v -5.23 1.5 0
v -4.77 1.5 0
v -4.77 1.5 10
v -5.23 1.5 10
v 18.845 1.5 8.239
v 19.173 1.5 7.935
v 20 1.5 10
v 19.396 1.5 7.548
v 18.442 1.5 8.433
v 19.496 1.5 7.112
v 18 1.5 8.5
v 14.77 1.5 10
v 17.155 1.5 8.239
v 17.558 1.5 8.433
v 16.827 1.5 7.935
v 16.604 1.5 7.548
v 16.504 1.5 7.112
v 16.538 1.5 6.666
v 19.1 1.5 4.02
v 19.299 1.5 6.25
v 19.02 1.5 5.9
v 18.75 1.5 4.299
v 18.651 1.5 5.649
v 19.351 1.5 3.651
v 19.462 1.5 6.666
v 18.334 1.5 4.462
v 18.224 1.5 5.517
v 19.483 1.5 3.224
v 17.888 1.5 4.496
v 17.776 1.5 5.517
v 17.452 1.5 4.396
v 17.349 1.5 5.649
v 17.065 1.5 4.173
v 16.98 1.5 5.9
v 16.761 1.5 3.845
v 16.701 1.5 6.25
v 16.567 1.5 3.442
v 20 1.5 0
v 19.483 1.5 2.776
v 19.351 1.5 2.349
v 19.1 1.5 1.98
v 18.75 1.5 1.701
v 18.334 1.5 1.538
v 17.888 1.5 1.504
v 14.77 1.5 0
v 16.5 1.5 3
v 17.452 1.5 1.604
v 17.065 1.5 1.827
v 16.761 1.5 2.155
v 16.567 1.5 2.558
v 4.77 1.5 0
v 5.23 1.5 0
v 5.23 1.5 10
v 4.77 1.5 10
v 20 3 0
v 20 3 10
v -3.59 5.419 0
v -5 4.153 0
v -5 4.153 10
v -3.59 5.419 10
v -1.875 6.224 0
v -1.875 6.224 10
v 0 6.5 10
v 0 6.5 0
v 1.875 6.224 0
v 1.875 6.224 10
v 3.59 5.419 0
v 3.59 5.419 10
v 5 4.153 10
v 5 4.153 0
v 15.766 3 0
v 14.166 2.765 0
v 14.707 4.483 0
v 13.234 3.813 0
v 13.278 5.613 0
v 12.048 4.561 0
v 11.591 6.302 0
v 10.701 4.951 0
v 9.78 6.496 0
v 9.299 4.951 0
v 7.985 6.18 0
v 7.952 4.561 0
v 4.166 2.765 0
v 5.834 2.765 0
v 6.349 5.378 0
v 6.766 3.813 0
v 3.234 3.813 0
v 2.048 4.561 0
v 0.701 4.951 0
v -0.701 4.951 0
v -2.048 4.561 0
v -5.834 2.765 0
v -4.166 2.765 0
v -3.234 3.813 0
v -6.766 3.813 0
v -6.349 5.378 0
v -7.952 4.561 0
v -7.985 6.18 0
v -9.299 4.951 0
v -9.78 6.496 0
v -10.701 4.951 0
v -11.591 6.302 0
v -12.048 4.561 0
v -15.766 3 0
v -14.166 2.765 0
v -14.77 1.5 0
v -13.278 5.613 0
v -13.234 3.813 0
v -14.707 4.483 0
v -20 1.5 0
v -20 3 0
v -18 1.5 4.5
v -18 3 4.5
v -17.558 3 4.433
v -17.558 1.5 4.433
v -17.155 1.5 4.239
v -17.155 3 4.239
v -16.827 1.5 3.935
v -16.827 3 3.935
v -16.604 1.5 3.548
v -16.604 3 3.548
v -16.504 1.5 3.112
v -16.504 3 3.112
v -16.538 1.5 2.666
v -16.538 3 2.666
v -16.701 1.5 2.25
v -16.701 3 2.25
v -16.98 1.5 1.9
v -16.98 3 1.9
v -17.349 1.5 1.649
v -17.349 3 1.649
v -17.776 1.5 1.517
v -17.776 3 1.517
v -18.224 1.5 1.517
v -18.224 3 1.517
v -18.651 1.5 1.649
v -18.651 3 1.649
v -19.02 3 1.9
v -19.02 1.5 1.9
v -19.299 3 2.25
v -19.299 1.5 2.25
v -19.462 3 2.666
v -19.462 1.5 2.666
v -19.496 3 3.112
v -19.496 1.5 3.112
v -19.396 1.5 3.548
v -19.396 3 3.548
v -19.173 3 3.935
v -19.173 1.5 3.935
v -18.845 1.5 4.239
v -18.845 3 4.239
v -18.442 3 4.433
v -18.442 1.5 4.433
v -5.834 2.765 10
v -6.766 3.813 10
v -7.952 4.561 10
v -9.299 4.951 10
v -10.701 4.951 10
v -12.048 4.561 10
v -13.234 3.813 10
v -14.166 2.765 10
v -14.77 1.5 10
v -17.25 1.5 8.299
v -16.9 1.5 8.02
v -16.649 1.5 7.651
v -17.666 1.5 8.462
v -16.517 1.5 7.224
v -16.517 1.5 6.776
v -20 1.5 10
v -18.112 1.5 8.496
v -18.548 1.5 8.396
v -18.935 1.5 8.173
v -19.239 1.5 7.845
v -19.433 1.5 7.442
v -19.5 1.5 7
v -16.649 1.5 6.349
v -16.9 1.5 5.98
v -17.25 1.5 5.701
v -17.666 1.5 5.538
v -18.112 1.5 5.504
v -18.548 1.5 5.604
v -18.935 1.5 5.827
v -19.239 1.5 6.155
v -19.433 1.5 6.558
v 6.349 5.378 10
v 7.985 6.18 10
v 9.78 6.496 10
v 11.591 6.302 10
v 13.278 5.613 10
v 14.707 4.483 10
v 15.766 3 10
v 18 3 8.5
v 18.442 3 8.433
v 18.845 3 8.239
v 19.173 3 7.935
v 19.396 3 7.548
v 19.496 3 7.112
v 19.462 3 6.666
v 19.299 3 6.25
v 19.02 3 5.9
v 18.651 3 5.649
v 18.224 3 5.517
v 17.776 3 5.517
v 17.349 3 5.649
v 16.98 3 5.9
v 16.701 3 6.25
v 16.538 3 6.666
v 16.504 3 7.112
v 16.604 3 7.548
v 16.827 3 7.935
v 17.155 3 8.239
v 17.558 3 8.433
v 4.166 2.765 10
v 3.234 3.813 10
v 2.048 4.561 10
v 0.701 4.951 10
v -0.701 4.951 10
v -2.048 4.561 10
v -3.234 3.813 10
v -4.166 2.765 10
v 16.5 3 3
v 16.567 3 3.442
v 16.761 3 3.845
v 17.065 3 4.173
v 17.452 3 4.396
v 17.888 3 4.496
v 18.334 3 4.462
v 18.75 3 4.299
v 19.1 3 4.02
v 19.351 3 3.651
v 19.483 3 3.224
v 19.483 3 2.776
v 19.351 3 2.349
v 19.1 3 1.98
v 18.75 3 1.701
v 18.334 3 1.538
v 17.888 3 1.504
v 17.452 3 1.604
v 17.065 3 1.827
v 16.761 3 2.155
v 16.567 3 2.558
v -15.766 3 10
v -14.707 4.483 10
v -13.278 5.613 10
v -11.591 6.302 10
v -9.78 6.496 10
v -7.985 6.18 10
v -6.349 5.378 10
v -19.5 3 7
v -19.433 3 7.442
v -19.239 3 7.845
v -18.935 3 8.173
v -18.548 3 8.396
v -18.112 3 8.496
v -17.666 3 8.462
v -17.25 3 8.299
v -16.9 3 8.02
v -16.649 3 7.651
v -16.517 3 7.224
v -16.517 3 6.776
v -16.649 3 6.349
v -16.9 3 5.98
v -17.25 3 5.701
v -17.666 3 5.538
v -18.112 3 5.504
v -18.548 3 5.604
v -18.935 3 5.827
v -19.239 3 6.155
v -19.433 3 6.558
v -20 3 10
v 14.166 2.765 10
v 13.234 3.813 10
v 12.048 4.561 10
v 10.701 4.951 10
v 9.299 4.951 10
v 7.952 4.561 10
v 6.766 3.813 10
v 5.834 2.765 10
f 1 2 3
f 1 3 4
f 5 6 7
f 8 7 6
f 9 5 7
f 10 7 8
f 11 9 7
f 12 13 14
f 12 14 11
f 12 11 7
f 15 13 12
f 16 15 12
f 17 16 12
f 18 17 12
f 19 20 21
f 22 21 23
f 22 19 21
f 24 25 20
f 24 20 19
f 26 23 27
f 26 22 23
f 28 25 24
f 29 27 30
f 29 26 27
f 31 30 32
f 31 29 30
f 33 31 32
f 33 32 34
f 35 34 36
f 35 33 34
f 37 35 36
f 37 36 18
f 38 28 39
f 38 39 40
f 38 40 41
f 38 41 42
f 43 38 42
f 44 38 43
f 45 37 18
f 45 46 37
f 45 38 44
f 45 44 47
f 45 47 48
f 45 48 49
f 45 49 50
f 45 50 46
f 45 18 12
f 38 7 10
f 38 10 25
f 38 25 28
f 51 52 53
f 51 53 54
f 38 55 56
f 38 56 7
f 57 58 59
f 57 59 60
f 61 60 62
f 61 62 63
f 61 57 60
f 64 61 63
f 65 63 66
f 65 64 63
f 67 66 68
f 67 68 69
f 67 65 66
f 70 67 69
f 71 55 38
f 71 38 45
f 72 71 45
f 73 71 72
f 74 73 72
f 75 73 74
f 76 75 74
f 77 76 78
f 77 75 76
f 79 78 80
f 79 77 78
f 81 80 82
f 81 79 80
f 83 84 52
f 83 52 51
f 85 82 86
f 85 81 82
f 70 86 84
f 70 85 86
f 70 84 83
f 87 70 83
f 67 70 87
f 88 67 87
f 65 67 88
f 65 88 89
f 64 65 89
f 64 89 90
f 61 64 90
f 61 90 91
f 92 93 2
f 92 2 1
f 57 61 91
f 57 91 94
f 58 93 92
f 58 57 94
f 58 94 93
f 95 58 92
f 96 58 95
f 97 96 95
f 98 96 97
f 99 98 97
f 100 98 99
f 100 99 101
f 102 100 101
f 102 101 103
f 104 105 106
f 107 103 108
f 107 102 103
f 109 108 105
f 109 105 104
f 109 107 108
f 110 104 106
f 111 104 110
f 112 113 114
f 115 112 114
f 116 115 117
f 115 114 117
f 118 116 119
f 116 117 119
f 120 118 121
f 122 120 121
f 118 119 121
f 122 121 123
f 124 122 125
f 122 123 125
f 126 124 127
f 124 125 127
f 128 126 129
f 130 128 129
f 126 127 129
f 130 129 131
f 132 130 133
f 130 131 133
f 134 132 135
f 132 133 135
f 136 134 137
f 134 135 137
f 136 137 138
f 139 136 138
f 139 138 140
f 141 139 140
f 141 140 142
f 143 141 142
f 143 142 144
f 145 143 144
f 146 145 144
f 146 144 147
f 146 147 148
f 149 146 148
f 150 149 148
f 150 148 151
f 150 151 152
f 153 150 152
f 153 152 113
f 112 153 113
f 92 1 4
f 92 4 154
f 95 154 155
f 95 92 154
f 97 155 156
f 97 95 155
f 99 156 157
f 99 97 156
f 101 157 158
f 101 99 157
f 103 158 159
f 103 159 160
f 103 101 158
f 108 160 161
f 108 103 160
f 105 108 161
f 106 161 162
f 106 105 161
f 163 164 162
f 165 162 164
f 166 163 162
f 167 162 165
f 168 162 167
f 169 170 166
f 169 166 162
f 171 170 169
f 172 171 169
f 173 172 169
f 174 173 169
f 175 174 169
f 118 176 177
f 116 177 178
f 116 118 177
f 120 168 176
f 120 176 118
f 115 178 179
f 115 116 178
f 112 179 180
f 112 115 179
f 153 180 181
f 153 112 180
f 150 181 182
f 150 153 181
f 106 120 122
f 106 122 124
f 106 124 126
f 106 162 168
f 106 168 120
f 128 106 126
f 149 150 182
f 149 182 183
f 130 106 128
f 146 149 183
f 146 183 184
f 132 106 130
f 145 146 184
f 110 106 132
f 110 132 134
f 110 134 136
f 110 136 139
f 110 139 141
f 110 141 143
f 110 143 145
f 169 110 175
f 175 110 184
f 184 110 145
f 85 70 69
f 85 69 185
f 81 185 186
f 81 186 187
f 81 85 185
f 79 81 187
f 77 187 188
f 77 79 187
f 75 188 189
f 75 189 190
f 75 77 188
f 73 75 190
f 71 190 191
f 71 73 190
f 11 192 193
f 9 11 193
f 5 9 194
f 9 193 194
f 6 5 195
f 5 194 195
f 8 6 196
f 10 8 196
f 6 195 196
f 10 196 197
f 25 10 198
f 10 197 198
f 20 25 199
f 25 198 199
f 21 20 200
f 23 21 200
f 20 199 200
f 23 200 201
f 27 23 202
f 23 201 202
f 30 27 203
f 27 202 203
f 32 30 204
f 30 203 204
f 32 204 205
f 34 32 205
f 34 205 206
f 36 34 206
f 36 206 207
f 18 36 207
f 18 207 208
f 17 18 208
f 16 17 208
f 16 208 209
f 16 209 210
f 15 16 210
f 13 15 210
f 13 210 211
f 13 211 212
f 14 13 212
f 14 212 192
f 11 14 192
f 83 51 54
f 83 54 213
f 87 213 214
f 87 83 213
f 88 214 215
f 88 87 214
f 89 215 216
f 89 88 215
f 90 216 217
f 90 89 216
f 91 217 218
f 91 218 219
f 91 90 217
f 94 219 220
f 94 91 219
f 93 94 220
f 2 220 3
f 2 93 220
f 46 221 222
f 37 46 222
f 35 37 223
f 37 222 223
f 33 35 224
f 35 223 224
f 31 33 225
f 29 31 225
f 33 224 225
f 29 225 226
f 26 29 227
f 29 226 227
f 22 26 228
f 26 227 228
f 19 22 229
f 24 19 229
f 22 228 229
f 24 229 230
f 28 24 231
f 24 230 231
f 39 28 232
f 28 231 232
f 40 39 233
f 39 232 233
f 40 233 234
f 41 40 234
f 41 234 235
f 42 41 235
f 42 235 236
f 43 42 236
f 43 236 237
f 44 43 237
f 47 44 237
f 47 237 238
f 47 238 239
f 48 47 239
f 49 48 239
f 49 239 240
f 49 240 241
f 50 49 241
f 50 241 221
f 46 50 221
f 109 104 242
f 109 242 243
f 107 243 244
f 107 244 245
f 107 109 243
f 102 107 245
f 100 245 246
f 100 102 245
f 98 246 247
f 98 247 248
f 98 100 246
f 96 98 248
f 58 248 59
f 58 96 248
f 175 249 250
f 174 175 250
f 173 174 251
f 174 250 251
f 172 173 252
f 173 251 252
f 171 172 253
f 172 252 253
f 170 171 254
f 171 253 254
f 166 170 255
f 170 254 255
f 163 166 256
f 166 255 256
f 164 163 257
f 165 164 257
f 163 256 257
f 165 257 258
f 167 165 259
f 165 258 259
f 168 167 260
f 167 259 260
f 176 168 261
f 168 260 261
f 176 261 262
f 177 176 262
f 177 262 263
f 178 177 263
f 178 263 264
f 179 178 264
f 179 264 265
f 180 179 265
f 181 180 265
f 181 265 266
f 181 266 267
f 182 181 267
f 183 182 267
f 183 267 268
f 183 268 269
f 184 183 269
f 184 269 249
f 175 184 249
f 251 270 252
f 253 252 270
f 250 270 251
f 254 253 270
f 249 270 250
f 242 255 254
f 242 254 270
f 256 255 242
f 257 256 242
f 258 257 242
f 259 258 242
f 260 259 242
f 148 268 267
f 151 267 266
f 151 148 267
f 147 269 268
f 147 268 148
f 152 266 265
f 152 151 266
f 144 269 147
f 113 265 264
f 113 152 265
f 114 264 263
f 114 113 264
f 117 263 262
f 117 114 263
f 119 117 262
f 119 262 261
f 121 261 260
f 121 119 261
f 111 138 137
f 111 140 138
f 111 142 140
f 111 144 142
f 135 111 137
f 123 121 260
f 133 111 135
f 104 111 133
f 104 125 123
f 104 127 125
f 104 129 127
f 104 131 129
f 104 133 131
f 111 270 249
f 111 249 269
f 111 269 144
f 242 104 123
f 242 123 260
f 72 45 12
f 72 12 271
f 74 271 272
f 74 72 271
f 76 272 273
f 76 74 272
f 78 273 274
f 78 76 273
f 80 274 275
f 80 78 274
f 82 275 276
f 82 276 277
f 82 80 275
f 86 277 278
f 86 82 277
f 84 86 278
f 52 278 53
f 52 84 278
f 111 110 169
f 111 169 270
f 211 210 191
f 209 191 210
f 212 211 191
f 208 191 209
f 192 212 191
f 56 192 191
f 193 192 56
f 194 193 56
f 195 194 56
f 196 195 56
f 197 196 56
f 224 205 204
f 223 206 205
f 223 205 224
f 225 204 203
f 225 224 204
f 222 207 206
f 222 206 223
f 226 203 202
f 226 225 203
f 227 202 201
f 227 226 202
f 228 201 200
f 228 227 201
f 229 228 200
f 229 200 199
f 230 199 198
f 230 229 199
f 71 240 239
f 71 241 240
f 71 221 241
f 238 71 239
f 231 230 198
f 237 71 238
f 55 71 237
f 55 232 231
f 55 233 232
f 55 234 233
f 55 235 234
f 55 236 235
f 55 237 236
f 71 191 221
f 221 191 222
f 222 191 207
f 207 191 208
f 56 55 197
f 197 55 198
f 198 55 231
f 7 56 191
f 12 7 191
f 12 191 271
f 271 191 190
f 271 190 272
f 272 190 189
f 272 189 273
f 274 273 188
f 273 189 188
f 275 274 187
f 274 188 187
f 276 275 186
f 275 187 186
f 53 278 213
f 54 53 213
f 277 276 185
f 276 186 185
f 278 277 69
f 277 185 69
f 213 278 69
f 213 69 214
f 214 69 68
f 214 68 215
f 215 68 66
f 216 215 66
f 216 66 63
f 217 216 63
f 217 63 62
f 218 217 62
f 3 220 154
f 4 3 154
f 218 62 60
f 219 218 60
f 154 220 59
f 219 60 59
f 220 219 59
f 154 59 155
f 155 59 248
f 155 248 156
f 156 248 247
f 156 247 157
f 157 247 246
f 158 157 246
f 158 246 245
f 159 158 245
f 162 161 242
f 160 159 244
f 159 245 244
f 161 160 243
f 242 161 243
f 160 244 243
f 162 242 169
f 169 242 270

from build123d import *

# Parameters (mm, degrees)
EXTRUDE_1_DEPTH     = 10
SKETCH_2_R          = 1.5
CUT_EXTRUDE_1_DEPTH = 10


with BuildPart() as part:
    # 草图1 → 凸台-拉伸1 (new body)
    with BuildSketch(Plane.XY):
        with BuildLine():
            Line((-20, 1.5), (-20, 3))
            Line((-20, 3), (-15.766281297, 3))
            ThreePointArc((-15.766281297, 3), (-10.6923358, 6.463023375), (-5, 4.153311931))
            ThreePointArc((-5, 4.153311931), (0, 6.5), (5, 4.153311931))
            ThreePointArc((5, 4.153311931), (10.6923358, 6.463023375), (15.766281297, 3))
            Line((15.766281297, 3), (20, 3))
            Line((20, 3), (20, 1.5))
            Line((20, 1.5), (14.769696007, 1.5))
            ThreePointArc((14.769696007, 1.5), (10, 5), (5.230303993, 1.5))
            Line((5.230303993, 1.5), (4.769696007, 1.5))
            ThreePointArc((4.769696007, 1.5), (0, 5), (-4.769696007, 1.5))
            Line((-4.769696007, 1.5), (-5.230303993, 1.5))
            ThreePointArc((-5.230303993, 1.5), (-10, 5), (-14.769696007, 1.5))
            Line((-14.769696007, 1.5), (-20, 1.5))
        make_face()
    extrude(amount=EXTRUDE_1_DEPTH)

    # 草图2 → 切除-拉伸1 (cut)
    with BuildSketch(Plane(origin=(0, 3, 0), x_dir=(1, 0, 0), z_dir=(0, 1, 0))):
        with Locations(Location((-18, -3, 0), (0, 0, 270))):
            Circle(SKETCH_2_R)
        with Locations(Location((-18, -7, 0), (0, 0, 180))):
            Circle(SKETCH_2_R)
        with Locations(Location((18, -7, 0), (0, 0, 270))):
            Circle(SKETCH_2_R)
        with Locations(Location((18, -3, 0), (0, 0, 180))):
            Circle(SKETCH_2_R)
    extrude(amount=-CUT_EXTRUDE_1_DEPTH, mode=Mode.SUBTRACT)


solid = part.part
